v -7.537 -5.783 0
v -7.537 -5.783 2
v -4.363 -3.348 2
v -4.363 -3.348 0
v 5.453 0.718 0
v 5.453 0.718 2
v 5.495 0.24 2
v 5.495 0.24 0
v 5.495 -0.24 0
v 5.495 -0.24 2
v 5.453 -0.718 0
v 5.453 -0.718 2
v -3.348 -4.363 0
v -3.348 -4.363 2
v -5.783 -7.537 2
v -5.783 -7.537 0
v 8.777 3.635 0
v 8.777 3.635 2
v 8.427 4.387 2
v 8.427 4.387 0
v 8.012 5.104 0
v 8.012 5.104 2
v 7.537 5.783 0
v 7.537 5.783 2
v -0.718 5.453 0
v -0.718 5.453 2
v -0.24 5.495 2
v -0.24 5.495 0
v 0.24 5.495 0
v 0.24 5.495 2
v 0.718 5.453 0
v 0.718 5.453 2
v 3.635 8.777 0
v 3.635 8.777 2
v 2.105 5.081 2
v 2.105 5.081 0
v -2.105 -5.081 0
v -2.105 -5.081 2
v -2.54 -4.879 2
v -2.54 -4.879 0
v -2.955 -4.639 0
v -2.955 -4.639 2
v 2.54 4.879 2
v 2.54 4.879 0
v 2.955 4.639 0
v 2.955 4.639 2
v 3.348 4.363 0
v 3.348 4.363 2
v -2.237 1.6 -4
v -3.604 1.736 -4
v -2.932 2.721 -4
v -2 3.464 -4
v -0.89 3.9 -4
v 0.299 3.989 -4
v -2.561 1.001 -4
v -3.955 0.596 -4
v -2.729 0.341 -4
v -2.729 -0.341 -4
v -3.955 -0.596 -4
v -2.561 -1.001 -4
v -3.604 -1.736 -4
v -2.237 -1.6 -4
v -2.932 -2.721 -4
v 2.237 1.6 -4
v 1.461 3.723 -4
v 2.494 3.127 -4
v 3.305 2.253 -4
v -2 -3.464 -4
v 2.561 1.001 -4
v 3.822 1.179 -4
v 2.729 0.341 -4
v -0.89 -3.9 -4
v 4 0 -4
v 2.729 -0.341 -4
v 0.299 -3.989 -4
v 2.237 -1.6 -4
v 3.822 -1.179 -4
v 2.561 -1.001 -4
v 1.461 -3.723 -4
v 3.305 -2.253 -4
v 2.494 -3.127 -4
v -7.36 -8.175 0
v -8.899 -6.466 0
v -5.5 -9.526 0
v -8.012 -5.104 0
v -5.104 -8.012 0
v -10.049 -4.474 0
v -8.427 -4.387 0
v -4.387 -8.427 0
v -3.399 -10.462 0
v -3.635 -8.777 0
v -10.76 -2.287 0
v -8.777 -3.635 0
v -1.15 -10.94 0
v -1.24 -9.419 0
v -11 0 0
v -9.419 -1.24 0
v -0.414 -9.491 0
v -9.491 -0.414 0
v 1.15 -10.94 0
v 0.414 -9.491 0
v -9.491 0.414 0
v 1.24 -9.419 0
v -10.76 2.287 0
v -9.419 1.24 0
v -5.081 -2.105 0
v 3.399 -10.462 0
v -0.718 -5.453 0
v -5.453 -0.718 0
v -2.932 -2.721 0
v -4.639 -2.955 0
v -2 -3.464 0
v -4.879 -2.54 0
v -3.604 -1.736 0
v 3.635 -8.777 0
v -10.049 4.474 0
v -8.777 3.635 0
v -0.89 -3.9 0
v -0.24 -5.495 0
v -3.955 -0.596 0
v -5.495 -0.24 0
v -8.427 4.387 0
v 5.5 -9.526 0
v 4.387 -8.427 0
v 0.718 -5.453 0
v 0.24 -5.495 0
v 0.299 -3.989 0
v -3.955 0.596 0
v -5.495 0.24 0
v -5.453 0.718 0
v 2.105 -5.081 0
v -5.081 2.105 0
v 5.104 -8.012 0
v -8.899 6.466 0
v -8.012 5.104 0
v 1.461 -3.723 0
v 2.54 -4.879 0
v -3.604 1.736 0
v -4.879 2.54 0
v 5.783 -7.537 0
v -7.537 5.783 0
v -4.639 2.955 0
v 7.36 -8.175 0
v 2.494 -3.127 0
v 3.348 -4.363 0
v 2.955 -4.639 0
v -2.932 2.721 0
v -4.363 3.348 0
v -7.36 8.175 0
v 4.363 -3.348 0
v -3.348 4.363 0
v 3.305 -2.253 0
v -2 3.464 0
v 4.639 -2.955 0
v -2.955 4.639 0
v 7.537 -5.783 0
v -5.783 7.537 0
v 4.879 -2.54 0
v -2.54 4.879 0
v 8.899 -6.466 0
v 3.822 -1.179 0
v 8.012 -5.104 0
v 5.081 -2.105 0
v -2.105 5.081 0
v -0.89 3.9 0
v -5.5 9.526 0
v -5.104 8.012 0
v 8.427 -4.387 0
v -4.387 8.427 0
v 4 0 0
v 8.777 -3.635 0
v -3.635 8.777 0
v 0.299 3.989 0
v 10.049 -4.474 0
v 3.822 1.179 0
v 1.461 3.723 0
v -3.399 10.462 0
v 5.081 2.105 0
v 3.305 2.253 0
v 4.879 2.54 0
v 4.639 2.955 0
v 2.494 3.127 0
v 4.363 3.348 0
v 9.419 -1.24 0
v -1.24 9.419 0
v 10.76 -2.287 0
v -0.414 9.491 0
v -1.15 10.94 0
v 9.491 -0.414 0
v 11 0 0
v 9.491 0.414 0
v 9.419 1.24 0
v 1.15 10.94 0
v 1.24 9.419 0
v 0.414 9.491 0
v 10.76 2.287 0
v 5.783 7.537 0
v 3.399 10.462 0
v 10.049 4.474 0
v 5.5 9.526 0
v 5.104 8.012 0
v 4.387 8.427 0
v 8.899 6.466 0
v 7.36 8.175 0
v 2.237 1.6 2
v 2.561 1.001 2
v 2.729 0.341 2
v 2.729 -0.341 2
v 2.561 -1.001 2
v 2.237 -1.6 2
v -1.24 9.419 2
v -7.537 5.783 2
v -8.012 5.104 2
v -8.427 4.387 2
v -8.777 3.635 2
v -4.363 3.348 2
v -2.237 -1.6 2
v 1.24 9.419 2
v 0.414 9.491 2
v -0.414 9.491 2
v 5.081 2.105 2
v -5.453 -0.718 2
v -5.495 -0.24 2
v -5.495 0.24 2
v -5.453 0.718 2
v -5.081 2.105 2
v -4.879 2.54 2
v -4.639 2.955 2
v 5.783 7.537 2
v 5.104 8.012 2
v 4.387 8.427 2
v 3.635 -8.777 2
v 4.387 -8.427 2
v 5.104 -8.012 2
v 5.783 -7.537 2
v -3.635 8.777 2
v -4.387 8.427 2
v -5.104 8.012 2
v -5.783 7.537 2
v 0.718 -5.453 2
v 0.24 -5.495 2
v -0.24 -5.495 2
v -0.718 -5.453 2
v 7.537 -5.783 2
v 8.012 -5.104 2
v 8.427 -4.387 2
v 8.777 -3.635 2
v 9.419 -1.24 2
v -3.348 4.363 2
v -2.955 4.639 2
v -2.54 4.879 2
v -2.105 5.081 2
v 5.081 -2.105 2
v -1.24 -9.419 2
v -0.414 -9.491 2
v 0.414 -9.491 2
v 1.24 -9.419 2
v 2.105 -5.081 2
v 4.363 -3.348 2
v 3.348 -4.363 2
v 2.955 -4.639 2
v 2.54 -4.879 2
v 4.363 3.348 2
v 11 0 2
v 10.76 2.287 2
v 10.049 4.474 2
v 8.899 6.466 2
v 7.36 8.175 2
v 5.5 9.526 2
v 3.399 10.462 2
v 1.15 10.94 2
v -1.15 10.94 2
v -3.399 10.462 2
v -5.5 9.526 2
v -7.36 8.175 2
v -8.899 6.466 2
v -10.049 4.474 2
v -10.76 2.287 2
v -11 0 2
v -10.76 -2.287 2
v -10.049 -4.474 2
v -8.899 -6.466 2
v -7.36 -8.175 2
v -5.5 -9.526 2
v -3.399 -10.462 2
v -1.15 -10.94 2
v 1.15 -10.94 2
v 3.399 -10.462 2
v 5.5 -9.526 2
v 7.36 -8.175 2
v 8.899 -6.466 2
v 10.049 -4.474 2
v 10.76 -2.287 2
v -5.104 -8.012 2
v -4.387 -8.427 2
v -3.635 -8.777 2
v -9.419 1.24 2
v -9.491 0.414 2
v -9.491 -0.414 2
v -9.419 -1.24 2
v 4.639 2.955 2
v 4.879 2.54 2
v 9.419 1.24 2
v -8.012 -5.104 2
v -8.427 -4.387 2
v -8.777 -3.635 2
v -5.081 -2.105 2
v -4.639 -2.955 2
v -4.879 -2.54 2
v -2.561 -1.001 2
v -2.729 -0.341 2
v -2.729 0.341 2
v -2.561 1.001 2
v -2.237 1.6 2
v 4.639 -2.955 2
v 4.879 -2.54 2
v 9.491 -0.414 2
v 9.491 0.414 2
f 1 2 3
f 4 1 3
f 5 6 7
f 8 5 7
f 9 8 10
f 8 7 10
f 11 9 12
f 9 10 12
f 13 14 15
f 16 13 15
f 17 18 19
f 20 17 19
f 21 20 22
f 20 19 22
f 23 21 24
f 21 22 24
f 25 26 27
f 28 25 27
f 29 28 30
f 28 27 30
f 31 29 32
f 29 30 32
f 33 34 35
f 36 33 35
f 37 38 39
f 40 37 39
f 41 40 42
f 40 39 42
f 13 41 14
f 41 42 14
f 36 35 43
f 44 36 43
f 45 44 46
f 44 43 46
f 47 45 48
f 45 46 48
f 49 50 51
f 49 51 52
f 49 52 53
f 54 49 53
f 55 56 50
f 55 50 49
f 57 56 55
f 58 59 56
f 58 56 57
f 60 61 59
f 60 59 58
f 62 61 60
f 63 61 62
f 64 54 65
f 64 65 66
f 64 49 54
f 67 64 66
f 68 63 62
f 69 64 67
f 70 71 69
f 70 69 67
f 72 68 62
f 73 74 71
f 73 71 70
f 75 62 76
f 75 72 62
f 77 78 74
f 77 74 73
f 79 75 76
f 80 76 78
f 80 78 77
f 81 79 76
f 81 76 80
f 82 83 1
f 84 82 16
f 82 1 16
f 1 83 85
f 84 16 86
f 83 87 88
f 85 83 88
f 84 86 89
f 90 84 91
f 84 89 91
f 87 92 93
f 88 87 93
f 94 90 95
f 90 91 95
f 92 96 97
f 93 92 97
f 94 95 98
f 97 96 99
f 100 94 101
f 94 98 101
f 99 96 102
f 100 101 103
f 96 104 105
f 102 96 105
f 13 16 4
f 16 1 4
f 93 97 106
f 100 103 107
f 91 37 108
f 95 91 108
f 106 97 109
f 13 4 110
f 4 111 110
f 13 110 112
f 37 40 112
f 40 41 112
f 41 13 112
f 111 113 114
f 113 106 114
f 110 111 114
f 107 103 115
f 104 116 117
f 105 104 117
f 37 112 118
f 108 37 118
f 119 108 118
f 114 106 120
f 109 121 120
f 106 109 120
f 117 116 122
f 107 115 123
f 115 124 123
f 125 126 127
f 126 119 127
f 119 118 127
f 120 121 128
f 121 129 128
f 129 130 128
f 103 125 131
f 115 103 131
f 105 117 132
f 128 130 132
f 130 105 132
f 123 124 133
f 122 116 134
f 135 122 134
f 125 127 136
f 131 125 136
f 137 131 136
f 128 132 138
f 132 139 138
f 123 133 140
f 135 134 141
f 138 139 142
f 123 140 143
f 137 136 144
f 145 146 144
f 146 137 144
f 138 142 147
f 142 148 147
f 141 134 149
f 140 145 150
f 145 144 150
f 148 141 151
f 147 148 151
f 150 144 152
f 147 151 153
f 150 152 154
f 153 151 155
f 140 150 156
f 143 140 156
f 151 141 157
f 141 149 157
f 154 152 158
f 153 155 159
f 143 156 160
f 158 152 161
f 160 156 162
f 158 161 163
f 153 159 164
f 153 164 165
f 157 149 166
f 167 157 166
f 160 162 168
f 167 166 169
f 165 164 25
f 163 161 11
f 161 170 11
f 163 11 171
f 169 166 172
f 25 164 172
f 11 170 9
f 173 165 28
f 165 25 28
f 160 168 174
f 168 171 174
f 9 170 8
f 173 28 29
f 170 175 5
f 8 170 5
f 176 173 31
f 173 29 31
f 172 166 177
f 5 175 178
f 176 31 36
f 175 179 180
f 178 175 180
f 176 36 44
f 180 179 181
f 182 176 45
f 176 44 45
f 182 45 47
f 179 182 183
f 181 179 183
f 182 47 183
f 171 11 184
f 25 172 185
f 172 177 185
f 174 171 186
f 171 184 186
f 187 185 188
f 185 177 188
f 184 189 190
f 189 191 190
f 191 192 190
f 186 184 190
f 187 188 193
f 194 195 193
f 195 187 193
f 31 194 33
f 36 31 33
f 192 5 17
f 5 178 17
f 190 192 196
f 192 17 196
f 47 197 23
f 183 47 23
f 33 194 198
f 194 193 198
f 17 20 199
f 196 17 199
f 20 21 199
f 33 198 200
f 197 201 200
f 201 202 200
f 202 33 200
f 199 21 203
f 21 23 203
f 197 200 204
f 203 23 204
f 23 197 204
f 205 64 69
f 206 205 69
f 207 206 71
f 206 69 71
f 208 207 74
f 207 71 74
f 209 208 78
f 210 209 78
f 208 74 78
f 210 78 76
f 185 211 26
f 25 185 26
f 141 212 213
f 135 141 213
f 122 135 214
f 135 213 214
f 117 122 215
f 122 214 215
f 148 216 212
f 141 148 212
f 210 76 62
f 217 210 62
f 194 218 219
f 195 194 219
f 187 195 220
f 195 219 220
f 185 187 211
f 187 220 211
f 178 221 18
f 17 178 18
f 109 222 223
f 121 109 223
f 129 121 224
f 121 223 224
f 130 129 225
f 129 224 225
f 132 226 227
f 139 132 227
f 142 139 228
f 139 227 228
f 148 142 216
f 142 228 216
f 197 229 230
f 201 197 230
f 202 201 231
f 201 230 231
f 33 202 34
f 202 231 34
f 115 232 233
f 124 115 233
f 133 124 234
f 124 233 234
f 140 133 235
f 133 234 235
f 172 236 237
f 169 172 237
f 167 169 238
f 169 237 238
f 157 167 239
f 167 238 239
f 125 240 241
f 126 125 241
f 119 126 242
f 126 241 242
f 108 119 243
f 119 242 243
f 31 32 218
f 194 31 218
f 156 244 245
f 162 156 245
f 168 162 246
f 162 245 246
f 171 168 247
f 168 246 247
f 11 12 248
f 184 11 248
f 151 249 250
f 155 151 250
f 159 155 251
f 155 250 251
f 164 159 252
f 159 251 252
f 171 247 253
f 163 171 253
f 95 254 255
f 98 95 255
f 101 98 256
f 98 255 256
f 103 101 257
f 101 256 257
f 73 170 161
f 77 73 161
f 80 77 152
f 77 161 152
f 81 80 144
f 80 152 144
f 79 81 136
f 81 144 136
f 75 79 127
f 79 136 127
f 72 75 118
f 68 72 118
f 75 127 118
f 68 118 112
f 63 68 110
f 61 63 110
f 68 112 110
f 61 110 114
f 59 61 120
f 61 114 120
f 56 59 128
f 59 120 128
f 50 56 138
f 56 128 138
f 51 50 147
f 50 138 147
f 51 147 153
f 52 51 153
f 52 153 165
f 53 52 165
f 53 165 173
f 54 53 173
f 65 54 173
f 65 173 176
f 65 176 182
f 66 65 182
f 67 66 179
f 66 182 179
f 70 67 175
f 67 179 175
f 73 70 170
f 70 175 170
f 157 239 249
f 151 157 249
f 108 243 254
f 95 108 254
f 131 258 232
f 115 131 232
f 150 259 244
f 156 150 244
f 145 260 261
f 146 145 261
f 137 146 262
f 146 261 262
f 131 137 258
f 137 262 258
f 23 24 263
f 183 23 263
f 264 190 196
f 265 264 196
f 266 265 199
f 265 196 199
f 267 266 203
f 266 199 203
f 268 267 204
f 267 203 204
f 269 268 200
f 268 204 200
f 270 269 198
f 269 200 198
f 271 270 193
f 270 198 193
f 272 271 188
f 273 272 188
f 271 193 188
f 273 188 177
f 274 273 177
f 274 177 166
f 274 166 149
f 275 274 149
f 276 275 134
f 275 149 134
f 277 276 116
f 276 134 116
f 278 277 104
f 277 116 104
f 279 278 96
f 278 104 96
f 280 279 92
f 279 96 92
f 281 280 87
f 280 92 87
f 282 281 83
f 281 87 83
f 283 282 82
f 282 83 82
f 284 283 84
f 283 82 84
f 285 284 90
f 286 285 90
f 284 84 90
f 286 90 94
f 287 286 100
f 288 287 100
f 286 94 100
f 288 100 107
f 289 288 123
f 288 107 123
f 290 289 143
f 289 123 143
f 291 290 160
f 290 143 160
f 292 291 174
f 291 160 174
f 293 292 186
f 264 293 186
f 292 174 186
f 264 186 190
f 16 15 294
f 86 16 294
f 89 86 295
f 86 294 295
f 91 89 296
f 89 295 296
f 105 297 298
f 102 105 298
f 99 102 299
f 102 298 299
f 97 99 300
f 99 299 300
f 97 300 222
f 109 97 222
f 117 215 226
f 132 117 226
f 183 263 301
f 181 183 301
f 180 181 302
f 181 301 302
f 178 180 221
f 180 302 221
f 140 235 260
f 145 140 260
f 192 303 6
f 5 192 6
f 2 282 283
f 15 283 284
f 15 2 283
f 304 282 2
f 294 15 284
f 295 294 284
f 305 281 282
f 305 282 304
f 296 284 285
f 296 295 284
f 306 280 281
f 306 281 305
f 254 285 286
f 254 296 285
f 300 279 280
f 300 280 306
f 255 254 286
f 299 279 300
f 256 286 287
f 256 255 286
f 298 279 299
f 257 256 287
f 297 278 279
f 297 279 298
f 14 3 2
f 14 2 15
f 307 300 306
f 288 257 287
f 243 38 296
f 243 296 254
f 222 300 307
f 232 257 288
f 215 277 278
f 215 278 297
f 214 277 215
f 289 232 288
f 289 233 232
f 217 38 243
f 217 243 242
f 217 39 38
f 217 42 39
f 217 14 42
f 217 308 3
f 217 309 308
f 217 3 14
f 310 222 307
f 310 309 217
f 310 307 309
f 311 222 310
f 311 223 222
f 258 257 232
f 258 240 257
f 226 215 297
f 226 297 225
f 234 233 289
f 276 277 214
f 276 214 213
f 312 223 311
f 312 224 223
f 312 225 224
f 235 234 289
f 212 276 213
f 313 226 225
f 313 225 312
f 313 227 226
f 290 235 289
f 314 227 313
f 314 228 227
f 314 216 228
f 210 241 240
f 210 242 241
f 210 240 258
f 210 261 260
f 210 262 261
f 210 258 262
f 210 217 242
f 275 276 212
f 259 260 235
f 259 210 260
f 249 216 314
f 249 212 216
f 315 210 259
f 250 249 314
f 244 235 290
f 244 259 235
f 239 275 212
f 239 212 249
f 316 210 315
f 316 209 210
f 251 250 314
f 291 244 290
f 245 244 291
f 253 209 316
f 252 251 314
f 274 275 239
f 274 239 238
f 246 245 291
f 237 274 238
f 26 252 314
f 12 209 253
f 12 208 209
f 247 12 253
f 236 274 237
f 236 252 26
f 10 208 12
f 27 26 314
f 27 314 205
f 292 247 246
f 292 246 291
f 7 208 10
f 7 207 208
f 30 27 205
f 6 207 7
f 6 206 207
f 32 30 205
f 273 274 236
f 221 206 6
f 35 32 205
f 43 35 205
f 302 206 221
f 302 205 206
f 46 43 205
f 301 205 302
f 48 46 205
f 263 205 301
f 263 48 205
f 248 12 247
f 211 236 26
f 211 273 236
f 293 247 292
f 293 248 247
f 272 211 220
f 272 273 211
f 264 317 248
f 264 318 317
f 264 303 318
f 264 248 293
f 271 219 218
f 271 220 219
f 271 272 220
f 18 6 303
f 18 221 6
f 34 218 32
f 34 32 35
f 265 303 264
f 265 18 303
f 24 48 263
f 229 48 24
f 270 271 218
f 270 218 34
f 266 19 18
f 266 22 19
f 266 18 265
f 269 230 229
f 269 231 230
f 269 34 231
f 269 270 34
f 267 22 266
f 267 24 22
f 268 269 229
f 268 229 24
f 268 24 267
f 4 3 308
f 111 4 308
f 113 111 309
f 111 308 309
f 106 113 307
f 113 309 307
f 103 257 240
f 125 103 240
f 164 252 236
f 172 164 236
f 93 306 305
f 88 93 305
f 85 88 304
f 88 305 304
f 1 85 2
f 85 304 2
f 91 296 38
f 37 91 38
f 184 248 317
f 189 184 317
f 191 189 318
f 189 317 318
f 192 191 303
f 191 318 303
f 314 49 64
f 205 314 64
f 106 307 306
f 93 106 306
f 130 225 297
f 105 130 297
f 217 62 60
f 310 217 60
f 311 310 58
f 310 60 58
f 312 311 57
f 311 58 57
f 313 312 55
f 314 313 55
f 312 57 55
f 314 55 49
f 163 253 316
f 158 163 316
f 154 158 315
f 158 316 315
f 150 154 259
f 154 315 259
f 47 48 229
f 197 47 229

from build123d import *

# Parameters (mm, degrees)
F0_R            = 11
F1_DEPTH        = 2
F3_DEPTH        = 2
F3_COPIES_COUNT = 12
F4_R            = 4
F5_DEPTH        = 4
F7_DEPTH        = 9


# Not quite as in the source:
# - a pattern or mirror of a feature is missing from the dataset's text; its kind, count and spacing are read off the source's solid


with BuildPart() as f1:
    # F0 (on Top) → F1 (new body)
    with BuildSketch(Plane.XY):
        Circle(F0_R)
    extrude(amount=F1_DEPTH)

    # F2 (on face) → F3 (cut)
    with BuildSketch(Plane.XY.offset(2)):
        with BuildLine():
            Line((9.4187261831, 1.2399988261), (5.4529467376, 0.7178940572))
            ThreePointArc((5.4529467376, 0.7178940572), (5.5, 0), (5.4529467376, -0.7178940572))
            Line((5.4529467376, -0.7178940572), (9.4187261831, -1.2399988261))
            ThreePointArc((9.4187261831, -1.2399988261), (9.5, 0), (9.4187261831, 1.2399988261))
        make_face()
    f3 = extrude(amount=-F3_DEPTH, mode=Mode.SUBTRACT)

    # F3_copies: F3 ×12 about axis
    f3_copies_axis = Axis((0, 0, 0), (0, 0, 1))
    for i in range(1, F3_COPIES_COUNT):
        add(f3.rotate(f3_copies_axis, i * 360 / F3_COPIES_COUNT), mode=Mode.SUBTRACT)

    # F4 (on face) → F5 (join)
    with BuildSketch(Plane(origin=(0, 0, 0), x_dir=(1, 0, 0), z_dir=(0, 0, -1))):
        Circle(F4_R)
    extrude(amount=F5_DEPTH)

    # F6 (on face) → F7 (cut)
    with BuildSketch(Plane(origin=(0, 0, -4), x_dir=(1, 0, 0), z_dir=(0, 0, -1))):
        with BuildLine():
            Line((-2.2366269246, -1.6), (2.2366269246, -1.6))
            ThreePointArc((2.2366269246, -1.6), (2.75, 0), (2.2366269246, 1.6))
            Line((2.2366269246, 1.6), (-2.2366269246, 1.6))
            ThreePointArc((-2.2366269246, 1.6), (-2.75, 0), (-2.2366269246, -1.6))
        make_face()
    extrude(amount=-F7_DEPTH, mode=Mode.SUBTRACT)


solid = f1.part
